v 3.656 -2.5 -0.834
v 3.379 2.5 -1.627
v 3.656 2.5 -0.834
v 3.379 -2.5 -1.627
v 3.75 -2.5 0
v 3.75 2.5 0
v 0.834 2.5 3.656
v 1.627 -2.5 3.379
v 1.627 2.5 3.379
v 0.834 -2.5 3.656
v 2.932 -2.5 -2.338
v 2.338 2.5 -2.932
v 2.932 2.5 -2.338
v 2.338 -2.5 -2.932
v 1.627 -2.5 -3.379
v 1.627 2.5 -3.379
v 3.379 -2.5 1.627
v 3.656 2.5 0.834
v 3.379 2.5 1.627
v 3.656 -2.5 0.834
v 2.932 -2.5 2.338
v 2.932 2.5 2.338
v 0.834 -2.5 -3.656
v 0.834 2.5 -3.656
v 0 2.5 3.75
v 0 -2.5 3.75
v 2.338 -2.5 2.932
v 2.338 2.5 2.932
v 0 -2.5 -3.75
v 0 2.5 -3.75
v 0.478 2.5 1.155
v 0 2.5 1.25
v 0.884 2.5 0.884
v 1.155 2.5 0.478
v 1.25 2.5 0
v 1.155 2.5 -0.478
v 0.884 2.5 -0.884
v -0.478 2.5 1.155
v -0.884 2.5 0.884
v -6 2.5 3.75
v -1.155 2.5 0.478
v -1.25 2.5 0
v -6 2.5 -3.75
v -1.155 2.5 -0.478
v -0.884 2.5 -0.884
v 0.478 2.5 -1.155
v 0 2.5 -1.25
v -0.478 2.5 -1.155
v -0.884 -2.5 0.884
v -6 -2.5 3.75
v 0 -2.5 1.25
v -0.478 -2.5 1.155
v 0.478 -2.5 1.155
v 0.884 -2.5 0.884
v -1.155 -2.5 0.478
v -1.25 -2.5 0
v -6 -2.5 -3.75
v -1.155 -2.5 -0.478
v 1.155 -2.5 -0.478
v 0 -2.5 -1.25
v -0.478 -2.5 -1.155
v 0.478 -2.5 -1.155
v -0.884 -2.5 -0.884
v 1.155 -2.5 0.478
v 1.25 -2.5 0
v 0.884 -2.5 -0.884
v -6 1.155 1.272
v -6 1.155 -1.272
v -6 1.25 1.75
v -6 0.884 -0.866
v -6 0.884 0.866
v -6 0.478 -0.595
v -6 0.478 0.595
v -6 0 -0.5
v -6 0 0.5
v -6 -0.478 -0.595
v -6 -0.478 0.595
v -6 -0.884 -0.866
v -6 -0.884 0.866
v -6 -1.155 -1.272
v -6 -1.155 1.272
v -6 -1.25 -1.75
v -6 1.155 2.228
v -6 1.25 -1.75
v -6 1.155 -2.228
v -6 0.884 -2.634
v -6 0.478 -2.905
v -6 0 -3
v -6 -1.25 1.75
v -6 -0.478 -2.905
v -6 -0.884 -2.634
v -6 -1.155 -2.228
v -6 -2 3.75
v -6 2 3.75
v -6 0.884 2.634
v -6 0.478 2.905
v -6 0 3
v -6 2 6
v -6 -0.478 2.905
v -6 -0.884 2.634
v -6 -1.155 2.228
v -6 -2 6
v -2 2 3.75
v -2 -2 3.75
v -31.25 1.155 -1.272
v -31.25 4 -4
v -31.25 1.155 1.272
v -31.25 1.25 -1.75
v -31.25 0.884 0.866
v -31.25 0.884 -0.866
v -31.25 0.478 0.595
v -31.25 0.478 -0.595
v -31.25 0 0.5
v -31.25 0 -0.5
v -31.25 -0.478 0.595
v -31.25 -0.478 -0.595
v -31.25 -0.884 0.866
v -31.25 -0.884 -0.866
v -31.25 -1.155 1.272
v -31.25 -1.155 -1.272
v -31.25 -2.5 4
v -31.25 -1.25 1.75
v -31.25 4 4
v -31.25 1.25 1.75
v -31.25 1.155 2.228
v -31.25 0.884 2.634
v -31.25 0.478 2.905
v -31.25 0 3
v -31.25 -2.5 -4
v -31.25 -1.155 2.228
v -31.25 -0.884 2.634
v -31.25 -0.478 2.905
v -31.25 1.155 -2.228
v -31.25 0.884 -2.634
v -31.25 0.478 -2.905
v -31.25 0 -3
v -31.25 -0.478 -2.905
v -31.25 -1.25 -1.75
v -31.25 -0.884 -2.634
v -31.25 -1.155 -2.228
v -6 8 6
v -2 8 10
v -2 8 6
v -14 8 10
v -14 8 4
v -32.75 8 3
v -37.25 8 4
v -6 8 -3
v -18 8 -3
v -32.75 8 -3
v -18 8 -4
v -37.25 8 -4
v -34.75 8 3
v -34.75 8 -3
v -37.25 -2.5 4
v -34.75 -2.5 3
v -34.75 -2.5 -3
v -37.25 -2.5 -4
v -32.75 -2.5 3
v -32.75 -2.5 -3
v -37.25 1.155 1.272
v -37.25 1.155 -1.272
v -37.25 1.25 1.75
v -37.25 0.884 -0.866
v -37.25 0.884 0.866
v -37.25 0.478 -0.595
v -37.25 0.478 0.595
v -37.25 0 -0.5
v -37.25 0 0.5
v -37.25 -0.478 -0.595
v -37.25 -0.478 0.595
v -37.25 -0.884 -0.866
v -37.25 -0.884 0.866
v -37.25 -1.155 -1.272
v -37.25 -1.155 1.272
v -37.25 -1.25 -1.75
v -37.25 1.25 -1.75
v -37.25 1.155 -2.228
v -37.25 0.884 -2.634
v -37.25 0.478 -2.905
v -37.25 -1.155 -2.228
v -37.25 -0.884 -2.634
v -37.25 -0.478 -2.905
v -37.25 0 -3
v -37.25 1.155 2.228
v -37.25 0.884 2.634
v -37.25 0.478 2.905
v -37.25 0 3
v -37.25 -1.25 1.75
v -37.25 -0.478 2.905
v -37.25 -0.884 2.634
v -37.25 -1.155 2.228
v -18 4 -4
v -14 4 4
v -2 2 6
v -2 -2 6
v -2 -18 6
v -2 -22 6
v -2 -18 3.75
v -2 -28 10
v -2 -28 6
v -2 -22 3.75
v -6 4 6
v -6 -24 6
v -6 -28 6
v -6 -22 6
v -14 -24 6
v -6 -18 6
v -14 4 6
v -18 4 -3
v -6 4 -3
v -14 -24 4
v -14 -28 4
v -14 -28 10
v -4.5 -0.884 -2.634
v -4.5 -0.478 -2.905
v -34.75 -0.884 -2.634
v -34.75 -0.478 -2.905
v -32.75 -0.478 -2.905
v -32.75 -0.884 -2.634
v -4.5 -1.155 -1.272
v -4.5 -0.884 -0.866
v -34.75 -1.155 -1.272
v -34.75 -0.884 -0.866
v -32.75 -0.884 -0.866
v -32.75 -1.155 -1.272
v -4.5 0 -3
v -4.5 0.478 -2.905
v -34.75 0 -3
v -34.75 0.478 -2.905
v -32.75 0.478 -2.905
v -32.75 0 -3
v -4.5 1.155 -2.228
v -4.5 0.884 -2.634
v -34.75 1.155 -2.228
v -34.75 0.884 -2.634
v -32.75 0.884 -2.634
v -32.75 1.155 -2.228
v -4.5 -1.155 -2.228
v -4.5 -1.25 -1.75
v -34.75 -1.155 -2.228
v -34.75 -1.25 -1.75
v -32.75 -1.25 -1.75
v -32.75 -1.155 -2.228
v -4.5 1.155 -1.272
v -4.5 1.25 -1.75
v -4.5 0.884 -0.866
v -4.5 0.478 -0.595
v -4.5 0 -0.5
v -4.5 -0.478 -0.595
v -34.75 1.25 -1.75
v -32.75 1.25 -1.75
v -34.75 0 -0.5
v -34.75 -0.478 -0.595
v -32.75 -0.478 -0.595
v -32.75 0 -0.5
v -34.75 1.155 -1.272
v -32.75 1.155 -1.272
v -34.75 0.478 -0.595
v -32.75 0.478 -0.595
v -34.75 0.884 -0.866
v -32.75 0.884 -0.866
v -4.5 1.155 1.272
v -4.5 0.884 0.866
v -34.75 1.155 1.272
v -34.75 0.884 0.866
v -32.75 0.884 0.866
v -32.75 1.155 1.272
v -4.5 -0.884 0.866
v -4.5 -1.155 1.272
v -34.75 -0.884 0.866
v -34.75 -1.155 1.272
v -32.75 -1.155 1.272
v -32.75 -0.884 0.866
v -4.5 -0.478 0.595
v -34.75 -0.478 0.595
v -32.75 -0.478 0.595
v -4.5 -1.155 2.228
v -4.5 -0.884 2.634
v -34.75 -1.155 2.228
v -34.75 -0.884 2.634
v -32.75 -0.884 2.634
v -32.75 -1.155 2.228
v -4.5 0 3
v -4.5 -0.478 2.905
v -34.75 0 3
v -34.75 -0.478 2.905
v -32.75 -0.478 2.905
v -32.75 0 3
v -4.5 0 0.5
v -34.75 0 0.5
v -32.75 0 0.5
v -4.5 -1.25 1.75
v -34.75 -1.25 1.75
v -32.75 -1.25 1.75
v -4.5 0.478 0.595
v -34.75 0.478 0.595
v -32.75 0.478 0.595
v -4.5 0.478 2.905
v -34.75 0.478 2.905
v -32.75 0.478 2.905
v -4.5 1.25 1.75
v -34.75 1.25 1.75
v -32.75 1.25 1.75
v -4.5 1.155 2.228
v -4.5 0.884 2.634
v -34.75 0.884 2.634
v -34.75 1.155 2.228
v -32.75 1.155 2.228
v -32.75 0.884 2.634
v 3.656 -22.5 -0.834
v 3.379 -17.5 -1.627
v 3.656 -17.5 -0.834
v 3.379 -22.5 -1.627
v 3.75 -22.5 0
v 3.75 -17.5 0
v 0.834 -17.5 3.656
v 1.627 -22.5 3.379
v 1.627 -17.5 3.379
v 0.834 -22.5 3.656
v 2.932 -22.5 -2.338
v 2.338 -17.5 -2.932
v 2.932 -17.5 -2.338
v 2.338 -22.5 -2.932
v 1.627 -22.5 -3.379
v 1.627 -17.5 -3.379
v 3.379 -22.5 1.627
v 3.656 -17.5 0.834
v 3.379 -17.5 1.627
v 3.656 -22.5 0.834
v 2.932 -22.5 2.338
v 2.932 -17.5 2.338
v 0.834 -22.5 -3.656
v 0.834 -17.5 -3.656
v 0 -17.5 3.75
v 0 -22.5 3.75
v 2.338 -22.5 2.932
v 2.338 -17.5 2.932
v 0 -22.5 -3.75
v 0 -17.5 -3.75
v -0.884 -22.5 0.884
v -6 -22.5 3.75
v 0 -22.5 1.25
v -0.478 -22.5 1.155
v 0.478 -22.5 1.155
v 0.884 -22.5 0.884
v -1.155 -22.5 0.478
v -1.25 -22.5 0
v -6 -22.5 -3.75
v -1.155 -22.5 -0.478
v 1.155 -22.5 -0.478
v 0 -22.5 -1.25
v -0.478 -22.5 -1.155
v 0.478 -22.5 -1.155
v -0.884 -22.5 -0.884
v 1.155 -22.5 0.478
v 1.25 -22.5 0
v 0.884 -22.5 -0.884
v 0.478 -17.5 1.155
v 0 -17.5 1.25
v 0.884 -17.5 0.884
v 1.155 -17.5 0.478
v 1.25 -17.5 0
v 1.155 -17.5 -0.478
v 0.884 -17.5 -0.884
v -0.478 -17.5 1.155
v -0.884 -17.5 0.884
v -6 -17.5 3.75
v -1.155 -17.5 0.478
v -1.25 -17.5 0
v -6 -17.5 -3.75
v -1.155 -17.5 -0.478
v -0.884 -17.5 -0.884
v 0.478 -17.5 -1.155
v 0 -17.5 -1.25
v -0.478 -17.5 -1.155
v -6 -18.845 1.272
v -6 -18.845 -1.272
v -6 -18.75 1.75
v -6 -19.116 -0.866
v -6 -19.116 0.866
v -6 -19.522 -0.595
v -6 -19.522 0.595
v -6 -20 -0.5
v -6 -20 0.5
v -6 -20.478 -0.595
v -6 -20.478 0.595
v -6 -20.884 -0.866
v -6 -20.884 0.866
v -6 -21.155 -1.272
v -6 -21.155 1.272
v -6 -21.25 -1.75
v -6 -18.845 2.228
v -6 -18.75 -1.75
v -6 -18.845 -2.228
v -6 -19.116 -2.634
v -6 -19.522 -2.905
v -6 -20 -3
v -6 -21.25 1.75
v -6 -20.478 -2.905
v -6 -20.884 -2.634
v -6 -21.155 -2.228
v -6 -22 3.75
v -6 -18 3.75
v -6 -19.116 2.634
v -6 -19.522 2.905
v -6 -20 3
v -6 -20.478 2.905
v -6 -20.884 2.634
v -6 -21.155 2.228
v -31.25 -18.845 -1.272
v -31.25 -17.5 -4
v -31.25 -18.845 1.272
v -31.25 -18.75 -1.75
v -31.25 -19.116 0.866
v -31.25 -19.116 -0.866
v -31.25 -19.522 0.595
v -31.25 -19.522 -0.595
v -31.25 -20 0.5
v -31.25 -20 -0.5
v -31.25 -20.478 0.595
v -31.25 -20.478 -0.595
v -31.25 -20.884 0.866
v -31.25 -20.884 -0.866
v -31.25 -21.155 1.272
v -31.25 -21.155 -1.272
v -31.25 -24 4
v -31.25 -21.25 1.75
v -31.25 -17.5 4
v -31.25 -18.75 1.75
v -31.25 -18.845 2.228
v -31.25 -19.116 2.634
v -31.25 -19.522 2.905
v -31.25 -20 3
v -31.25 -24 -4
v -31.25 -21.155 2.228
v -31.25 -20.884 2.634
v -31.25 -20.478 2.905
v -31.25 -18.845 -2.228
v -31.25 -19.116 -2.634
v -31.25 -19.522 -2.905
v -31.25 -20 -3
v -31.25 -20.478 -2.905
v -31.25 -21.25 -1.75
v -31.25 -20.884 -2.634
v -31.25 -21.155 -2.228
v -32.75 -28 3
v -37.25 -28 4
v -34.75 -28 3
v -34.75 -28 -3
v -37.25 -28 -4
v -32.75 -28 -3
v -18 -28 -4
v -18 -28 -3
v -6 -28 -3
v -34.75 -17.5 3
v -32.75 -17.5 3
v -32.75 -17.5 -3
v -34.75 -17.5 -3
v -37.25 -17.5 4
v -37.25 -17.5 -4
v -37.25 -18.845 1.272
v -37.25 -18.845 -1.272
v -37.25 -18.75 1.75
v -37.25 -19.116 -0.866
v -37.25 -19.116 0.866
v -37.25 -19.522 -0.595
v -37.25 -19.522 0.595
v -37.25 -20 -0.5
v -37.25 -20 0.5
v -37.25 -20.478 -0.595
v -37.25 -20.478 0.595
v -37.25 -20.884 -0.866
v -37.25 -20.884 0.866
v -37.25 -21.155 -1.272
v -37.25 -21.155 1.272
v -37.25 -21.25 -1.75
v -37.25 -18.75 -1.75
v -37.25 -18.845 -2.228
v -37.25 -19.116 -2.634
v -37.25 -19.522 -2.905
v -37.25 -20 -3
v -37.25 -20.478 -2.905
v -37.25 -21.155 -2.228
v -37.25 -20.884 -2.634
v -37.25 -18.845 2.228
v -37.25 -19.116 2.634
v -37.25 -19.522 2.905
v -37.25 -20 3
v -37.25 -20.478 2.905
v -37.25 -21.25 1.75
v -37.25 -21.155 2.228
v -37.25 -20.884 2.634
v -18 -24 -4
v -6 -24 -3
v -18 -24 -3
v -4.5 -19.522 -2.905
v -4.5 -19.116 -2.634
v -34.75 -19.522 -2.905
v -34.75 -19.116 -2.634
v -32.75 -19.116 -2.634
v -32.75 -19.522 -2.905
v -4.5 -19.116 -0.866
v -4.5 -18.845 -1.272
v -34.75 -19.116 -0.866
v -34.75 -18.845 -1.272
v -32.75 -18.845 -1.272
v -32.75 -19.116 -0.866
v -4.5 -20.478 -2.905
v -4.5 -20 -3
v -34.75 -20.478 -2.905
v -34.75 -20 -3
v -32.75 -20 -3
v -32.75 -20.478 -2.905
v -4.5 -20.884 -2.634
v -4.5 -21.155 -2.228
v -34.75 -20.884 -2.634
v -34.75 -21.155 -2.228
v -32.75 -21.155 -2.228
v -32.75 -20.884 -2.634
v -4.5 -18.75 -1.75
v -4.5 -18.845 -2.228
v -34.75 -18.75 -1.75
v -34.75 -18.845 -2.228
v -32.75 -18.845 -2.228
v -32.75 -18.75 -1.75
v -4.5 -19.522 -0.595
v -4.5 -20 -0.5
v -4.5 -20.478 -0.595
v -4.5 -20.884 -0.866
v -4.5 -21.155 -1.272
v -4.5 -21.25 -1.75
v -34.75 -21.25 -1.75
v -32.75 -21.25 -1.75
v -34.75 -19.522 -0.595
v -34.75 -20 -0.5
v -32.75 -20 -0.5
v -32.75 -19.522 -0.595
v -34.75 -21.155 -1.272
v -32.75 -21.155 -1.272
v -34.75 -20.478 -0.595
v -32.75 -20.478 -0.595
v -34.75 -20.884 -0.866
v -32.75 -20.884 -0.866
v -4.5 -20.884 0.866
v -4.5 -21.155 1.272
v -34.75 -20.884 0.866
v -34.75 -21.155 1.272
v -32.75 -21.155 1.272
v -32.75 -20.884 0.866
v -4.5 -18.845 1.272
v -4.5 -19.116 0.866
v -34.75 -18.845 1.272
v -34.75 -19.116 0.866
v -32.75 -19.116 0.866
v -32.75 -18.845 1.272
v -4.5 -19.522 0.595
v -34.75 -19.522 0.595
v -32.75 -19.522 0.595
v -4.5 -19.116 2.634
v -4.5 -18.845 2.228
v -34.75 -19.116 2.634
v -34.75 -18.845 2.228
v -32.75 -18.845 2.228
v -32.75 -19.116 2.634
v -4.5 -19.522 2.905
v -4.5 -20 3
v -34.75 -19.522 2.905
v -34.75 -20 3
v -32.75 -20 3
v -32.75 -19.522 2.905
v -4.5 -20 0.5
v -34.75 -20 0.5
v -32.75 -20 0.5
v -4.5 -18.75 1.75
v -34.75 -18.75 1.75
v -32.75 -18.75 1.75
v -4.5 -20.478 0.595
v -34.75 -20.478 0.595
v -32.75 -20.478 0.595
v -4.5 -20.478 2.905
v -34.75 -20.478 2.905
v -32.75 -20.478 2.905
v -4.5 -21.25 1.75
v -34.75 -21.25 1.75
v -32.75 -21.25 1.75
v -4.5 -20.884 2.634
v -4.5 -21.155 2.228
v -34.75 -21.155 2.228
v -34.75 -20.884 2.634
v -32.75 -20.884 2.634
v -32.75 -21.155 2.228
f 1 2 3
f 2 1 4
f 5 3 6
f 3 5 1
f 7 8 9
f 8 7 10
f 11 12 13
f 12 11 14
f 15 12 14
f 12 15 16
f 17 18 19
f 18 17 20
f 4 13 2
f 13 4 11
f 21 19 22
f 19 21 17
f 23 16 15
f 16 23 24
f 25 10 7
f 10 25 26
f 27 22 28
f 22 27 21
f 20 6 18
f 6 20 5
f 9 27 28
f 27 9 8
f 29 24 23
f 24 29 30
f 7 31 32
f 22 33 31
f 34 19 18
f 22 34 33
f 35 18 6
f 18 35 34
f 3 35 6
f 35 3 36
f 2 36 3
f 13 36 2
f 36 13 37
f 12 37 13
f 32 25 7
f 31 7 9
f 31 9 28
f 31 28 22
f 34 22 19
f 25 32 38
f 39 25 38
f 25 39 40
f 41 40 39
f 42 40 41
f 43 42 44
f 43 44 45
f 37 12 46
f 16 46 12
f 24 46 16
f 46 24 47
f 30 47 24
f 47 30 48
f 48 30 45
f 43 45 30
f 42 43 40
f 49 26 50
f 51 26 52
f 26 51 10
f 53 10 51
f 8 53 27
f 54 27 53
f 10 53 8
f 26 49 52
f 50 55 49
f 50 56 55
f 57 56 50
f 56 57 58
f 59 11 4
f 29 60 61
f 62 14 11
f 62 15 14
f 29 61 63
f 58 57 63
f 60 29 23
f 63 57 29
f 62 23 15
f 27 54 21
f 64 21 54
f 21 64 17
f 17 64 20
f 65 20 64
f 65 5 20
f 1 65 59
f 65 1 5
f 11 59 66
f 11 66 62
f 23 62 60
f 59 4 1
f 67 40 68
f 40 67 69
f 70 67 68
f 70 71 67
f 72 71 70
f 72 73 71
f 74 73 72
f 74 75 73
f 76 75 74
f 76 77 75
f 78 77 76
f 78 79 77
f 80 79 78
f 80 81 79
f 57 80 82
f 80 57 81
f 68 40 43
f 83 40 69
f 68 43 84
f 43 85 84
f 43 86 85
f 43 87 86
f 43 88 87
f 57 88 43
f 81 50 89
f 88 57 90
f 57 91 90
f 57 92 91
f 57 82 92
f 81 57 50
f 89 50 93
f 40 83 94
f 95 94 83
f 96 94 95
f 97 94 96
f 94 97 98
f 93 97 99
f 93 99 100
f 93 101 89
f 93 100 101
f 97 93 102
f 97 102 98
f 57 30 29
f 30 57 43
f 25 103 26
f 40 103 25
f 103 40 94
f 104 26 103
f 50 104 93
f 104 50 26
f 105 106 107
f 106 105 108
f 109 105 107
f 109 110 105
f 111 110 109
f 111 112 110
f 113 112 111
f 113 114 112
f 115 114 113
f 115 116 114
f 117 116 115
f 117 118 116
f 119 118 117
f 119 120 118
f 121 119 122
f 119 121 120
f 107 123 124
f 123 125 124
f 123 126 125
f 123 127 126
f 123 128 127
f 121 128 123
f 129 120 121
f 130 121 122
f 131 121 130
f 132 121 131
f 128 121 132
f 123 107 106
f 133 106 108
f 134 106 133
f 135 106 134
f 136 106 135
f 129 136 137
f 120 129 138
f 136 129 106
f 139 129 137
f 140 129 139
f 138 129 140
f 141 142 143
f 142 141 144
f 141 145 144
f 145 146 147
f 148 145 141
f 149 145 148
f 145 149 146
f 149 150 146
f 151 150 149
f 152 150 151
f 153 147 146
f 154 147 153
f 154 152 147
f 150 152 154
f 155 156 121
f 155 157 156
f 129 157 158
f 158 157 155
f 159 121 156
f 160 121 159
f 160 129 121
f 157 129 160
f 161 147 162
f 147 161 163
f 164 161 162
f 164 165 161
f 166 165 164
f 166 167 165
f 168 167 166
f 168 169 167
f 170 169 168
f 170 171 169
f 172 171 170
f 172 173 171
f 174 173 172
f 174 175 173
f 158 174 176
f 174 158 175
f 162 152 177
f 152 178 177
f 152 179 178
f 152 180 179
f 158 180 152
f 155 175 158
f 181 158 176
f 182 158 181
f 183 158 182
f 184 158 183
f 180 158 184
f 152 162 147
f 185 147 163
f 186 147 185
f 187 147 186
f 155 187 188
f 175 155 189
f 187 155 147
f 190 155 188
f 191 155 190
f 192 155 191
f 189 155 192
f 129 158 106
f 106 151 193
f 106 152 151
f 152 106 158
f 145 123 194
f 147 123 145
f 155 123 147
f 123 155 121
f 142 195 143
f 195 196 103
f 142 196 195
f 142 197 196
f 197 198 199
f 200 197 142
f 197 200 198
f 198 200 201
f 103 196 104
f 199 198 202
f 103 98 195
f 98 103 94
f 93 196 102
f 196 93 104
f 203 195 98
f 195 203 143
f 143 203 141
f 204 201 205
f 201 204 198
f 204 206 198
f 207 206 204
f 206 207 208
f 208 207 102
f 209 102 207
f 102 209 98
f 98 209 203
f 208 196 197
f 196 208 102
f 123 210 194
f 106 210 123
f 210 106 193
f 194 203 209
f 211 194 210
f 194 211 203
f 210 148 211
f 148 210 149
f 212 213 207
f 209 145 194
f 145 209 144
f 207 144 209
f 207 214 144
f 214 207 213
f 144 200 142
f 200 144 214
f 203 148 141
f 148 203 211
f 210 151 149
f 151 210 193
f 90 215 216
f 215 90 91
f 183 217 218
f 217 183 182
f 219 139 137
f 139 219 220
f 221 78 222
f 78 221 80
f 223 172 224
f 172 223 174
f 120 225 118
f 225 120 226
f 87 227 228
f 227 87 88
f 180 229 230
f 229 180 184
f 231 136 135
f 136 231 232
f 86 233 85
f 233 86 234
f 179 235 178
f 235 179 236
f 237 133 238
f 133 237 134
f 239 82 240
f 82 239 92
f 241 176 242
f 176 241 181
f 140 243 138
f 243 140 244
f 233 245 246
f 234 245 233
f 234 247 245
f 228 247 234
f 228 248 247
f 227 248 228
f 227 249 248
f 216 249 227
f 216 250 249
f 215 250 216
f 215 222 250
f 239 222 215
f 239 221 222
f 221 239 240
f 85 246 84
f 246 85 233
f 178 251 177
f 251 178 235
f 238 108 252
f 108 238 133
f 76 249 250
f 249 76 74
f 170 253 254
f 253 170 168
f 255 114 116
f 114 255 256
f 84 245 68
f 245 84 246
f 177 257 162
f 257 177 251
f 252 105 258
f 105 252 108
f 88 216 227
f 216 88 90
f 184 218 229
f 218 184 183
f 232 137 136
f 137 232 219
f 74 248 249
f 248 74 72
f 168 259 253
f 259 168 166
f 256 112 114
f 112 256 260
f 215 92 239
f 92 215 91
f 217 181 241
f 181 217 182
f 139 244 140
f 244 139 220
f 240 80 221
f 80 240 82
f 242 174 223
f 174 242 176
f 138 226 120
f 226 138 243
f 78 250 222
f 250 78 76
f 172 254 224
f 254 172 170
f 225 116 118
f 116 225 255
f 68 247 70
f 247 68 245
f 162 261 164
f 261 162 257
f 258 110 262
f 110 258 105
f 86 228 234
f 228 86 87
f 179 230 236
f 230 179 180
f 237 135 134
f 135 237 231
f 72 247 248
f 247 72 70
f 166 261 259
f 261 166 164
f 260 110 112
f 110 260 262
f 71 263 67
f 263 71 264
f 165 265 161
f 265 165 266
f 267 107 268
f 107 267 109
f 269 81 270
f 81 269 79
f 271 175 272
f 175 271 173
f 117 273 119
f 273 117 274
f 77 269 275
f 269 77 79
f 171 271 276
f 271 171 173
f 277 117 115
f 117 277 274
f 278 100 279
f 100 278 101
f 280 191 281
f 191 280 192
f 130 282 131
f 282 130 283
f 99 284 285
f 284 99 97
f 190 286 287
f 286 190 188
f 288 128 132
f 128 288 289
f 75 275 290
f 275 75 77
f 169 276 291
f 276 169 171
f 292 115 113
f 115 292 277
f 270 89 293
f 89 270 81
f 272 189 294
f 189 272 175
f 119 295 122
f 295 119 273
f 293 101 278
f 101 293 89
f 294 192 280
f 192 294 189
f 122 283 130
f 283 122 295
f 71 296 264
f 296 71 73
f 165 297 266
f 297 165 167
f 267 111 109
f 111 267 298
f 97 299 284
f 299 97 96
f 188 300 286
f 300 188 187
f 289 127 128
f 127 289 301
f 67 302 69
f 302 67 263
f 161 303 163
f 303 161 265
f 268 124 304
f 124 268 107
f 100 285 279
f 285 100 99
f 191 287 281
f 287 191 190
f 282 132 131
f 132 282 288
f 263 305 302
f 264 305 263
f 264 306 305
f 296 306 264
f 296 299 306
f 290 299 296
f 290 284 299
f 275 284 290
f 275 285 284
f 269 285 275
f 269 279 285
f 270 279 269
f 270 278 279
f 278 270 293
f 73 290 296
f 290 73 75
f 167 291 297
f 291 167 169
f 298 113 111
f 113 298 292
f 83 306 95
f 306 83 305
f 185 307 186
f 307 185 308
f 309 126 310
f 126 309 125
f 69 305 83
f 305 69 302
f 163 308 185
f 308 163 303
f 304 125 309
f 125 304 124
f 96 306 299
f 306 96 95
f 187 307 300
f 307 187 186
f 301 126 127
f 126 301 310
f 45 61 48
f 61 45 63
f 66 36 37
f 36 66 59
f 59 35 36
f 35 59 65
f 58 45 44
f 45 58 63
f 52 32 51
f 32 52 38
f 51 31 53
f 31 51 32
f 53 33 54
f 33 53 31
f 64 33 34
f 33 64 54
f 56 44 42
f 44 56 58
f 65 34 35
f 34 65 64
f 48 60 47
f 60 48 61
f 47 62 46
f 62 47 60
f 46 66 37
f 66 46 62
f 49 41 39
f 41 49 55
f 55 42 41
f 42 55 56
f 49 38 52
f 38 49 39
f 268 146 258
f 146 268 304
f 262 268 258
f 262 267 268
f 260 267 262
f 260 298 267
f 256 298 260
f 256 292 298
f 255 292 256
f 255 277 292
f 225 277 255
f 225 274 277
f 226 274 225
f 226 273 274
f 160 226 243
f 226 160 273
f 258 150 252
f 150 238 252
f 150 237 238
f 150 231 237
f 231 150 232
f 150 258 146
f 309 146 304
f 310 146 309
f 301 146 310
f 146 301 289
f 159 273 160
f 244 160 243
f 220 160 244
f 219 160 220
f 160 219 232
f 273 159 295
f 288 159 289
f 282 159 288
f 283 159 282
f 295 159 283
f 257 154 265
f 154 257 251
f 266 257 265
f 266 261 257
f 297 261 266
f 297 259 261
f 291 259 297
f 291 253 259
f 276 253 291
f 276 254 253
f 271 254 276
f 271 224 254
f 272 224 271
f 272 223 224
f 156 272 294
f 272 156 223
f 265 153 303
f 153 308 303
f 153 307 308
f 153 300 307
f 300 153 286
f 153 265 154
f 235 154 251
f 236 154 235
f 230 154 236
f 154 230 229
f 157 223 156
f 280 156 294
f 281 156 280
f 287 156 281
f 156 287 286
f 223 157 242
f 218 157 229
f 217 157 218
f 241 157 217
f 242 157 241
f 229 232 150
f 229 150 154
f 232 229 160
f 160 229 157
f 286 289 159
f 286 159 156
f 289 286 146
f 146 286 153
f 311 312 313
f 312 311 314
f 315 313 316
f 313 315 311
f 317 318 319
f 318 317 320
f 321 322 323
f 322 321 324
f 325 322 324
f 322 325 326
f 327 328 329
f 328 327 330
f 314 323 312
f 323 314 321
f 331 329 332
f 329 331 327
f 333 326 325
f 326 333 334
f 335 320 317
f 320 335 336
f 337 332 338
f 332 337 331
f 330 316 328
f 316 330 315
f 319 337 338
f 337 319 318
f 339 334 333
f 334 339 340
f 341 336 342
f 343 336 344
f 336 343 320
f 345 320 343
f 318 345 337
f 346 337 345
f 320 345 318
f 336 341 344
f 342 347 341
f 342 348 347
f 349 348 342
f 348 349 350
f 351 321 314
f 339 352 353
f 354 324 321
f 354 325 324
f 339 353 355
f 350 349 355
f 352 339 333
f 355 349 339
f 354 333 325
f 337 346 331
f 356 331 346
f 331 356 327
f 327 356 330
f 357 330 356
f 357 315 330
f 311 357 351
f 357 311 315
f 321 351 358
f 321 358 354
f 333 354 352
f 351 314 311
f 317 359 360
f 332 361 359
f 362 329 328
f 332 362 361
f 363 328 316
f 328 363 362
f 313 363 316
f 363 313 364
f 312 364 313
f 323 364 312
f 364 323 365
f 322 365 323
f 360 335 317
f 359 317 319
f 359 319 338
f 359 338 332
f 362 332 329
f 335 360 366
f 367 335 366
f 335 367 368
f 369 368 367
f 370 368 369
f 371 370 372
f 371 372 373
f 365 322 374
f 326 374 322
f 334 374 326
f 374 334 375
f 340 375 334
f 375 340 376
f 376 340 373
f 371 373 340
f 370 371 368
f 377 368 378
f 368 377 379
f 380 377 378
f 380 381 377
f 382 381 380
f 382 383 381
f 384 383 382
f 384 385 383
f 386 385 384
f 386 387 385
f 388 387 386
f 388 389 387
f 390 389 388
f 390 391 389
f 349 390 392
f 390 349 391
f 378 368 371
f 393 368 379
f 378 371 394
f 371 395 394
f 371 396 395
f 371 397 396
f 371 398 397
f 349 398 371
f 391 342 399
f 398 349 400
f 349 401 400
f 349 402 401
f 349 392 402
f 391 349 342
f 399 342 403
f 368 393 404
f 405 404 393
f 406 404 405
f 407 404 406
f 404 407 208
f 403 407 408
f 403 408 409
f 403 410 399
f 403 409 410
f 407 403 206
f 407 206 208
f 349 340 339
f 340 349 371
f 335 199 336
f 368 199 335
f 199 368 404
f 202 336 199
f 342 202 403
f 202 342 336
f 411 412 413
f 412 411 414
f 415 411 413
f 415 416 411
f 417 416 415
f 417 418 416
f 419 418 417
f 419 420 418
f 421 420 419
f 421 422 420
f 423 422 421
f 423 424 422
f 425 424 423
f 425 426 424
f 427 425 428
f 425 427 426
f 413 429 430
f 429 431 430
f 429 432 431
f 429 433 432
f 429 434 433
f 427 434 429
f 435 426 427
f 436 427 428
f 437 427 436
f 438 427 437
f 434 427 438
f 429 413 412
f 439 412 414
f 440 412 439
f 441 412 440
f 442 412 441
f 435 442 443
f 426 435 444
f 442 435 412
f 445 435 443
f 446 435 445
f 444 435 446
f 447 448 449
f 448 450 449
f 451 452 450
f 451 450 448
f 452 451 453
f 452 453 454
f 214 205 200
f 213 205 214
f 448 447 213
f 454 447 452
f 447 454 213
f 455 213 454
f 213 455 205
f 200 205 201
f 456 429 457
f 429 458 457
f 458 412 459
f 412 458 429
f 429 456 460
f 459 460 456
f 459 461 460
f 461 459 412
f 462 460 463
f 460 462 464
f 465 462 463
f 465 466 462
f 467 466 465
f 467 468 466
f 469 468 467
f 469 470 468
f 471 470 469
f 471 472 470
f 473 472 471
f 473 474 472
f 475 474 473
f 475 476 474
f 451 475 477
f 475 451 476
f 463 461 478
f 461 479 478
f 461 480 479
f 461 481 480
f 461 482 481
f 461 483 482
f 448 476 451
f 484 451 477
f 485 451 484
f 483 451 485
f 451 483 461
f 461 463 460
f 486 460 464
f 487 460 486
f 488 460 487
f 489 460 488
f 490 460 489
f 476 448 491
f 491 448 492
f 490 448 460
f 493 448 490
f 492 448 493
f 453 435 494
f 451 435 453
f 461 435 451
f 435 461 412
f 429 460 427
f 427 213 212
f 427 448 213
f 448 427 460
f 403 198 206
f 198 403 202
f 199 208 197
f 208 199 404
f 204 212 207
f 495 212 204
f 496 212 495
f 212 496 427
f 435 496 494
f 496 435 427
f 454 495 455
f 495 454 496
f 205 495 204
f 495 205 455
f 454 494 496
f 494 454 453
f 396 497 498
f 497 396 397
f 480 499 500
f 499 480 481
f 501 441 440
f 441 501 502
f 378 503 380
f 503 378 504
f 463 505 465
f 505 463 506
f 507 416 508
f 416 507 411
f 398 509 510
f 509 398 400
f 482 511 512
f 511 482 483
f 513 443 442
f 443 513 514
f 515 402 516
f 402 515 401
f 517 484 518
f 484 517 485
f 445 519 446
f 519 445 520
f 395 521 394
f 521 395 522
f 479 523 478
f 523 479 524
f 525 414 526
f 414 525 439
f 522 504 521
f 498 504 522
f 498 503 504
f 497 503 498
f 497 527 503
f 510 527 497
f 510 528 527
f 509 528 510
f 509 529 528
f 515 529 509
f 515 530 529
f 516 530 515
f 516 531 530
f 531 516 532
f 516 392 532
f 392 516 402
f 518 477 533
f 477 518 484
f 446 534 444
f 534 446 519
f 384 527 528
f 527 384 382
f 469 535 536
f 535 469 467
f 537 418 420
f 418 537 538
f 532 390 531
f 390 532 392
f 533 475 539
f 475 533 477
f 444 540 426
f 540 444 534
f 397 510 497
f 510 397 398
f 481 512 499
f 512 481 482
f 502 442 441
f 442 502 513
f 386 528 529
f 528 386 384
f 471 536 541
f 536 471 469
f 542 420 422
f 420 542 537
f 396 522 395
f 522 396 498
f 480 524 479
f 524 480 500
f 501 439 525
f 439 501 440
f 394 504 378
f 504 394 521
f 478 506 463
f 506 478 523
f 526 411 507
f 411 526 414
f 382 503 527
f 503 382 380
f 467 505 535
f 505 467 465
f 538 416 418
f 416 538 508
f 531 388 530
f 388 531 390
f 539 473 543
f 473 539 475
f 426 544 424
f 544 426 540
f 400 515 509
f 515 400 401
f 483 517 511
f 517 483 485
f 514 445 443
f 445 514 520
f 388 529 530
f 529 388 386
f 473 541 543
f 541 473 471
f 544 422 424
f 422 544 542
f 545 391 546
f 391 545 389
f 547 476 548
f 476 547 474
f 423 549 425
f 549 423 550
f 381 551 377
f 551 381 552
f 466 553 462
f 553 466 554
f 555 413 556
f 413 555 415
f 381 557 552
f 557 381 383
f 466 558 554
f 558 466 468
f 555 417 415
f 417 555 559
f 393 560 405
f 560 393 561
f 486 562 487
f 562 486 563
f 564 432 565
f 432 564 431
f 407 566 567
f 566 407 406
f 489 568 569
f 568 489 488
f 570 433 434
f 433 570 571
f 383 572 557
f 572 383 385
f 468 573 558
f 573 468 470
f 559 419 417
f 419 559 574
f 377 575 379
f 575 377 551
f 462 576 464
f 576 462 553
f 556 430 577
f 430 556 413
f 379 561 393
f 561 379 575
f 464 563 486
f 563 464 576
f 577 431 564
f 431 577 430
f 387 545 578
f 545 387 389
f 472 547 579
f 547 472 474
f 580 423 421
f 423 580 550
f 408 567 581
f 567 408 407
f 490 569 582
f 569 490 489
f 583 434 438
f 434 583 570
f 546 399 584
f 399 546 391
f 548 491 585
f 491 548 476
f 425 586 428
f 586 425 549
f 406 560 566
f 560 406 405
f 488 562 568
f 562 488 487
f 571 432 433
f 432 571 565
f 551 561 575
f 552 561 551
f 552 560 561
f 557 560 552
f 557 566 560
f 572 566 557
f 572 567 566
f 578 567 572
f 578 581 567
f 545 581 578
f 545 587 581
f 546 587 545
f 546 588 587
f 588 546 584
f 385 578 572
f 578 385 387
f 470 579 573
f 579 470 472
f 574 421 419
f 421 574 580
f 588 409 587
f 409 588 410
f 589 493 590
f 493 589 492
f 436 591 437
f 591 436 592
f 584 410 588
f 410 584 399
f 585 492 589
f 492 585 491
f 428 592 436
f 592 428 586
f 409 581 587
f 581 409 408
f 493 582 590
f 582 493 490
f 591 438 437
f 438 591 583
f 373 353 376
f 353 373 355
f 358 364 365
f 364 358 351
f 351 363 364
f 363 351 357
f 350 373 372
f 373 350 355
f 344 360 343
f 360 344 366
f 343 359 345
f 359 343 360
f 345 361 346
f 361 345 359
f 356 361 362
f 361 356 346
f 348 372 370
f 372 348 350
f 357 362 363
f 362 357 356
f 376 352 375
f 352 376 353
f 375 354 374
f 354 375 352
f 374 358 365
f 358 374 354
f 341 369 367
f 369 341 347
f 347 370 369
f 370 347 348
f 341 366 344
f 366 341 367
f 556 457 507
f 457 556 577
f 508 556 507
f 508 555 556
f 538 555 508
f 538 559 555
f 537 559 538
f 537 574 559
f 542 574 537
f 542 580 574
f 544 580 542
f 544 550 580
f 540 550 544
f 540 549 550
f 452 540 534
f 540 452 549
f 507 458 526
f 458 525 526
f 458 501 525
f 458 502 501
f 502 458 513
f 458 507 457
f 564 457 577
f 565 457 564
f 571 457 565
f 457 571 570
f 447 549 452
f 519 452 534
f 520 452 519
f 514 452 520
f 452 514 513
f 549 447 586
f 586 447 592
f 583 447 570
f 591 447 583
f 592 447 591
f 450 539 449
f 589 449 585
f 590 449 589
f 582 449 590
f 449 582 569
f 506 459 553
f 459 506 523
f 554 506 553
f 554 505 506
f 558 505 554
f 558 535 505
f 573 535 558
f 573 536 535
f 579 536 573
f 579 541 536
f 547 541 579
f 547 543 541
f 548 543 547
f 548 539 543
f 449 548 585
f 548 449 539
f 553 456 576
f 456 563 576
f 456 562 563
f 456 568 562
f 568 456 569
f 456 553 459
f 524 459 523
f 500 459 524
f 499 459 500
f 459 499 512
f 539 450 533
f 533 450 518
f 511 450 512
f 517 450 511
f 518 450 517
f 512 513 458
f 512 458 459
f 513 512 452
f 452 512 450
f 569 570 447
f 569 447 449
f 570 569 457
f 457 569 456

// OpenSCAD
// file: ../motors/MN5212.scad
use <../utils.scad>

module MN5212(){

	//render(){
		difference(){
			union(){
				translate([0,0, 42.5 / 2 - 23 / 2 - 4.9 - 6])
					cylinder(
						h = 23,
						r = 59 / 2,
						$fa = fa(59 / 2),
						center = true);
				translate([0,0, 42.5 / 2 - 4.9 / 2 - 6])
					cylinder(
						h = 4.9,
						r1 = 59 / 2,
						r2 = 24.8 / 2,
						$fa = fa(59 / 2),
						center = true);
				translate([0,0, - 42.5 / 2 + 5.6 / 2 + 3])
					cylinder(
						h = 5.6,
						r1 = 44 / 2,
						r2 = 59 / 2,
						$fa = fa(59 / 2),
						center = true);
				translate([0, 0, 42.5 / 2 - 3])
					cylinder(
						h = 6,
						r = 4 / 2,
						$fa = fa(4 / 2),
						center = true);
				translate([0, 0, - 42.5 / 2 + 1.5])
					cylinder(
						h = 3,
						r = 6 / 2,
						$fa = fa(6 / 2),
						center = true);
			}
			union(){
				for(i = [0:90:270])
					rotate([0, 0, i])
						translate([0, 25 / 2, -16.25 - 0.025])
							cylinder(
								h = 4,
								r = 3 / 2,
								$fa = fa(3 / 2),
								center = true);
				for(i = [0:120:240])
					rotate([0, 0, i])
						translate([0, 17 / 2, 12.75 + 0.025])
							cylinder(
								h = 5,
								r = 3 / 2,
								$fa = fa(3 / 2),
								center = true);
				rotate([0, 0, 30])
					translate([0, 12 / 2, 12.75 + 0.025])
						cylinder(
							h = 5,
							r = 3 / 2,
							$fa = fa(3 / 2),
							center = true);
				rotate([0, 0, 30 + 180])
					translate([0, 12 / 2, 12.75 + 0.025])
						cylinder(
							h = 5,
							r = 3 / 2,
							$fa = fa(3 / 2),
							center = true);
			}
		}

	//}

}

MN5212();
// file: ../servos/TGY_4805_2PA.scad
use <../utils.scad>

module TGY_4805_2PA(){

	length = 40;
	width = 20;
	depth = 36.4;
	wing_width = 58;
	wing_thick = 2.45;
	wing_height = 27.7;
	shaft_offset = 9.5;
	hole_seperation = 9.2;
	hole_spacing = 50;
	shaft_height = 40;
	shaft_length = 3.6;
	hole_diameter = 4.8;

	module mounting_hole(){
		mh_rad = hole_diameter / 2;
		translate(
			[
				hole_spacing / 2,
				0,
				-depth / 2 + wing_height - wing_thick / 2
			])
			cylinder(h = 5, r = mh_rad, $fa = fa(mh_rad), center = true);
	}

	difference(){
		union(){
			cube([length, width, depth], center = true);
			translate([0, 0, -depth / 2 + wing_height - wing_thick / 2])
				cube([wing_width, width, wing_thick], center = true);
			translate(
				[
					- length / 2 + shaft_offset,
					0,
					shaft_height - length / 2 + shaft_length / 2
				])
				cylinder(
					h = shaft_length,
					r = 1.5,
					$fa = fa(1.5),
					center = true);
		}	union(){

			translate([0, hole_seperation / 2, 0]){
				mounting_hole();
				mirror() mounting_hole();
			}
			translate([0, -hole_seperation / 2, 0]){
				mounting_hole();
				mirror() mounting_hole();
			}
		}
	}
}

module TGY_4805_2PA_translate(){
	length = 40;
	shaft_offset = 9.5;
	shaft_height = 40;
	shaft_length = 3.6;
	translate(
		[
				- length / 2 + shaft_offset,
				0,
				shaft_height - length / 2 + shaft_length / 2
		]) children();
}

TGY_4805_2PA();
// file: ../servos/HS_5065MG.scad
use <../utils.scad>

module HS_5065MG(){

	length = 23.75;
	width = 11.68;
	depth = 20.32;
	wing_width = 32.38;
	wing_thick = 2;
	wing_offset = 1;
	shaft_offset = 6;
	hole_spacing = 28.32;
	hole_spacing_2 = 27;
	hole_2_wide = 6;
	hole_diameter = 2;
	shaft_height = 26.16;
	shaft_length = 2;

	module mounting_hole(){
		mh_rad = hole_diameter / 2;
		translate(
			[
				hole_spacing / 2,
				0,
				depth / 2 - wing_thick / 2
			])
			cylinder(h = 5, r = mh_rad, $fa = fa(mh_rad), center = true);
		translate(
			[
				hole_spacing_2 / 2,
				hole_2_wide / 2,
				depth / 2 - wing_thick / 2
			])
			cylinder(h = 5, r = mh_rad, $fa = fa(mh_rad), center = true);
		translate(
			[
				hole_spacing_2 / 2,
				- hole_2_wide / 2,
				depth / 2 - wing_thick / 2
			])
			cylinder(h = 5, r = mh_rad, $fa = fa(mh_rad), center = true);
	}

	difference(){
		union(){
			cube([length, width, depth], center = true);
			translate([0, 0, depth / 2 - wing_thick / 2 - wing_offset])
				cube([wing_width, width, wing_thick], center = true);
			translate(
				[
					- length / 2 + shaft_offset,
					0,
					depth / 2 + 3.8 + 1.9 + shaft_length / 2
				])
				cylinder(
					h = shaft_length,
					r = 1.5,
					$fa = fa(1.5),
					center = true);
			translate(
				[
					- length / 2 + shaft_offset,
					0,
					depth / 2 + 3.8 / 2
				])
				cylinder(
					h = 3.8,
					r = 11.3 / 2,
					$fa = fa(11.3 / 2),
					center = true);
			translate(
				[
					- length / 2 + shaft_offset,
					0,
					depth / 2 + 3.8 + 1.9 / 2
				])
				cylinder(
					h = 1.9,
					r1 = 11.3 / 2,
					r2 = 8 / 2,
					$fa = fa(11.3 / 2),
					center = true);
		}	union(){

			mounting_hole();
			mirror() mounting_hole();
		}
	}
}

module HS_5065MG_arm(){

	hole_size = 1.5;
	hole_spacing = 3;
	hole_offset = 9.6;

	difference(){
		union(){
			translate([0, 0, 4.4 / 2])
				cylinder(
					h = 4.4,
					r = 8 / 2,
					$fa = fa(8 / 2),
					center = true);
			hull(){
				translate([0, 0, 4.4 - 1.8 / 2])
					cylinder(
						h = 1.8,
						r = 8 / 2,
						$fa = fa(8 / 2),
						center = true);
				translate([18.8, 0, 4.4 - 1.8 / 2])
					cylinder(
						h = 1.8,
						r = 5 / 2,
						$fa = fa(5 / 2),
						center = true);
			}
		}
		union(){
			for(i = [0:3]){
				translate([hole_offset + hole_spacing * i, 0, 4.4 - 1.8 / 2])
					cylinder(
						h = 5,
						r = hole_size / 2,
						$fa = fa(hole_size / 2),
						center = true);
			}
		}
	}
}

module HS_5065MG_shaft_translate(){
	translate(
		[
			- 23.75 / 2 + 6,
			0,
			20.32 / 2 + 3.8 + 1.9
		])
			children();
}

HS_5065MG();
HS_5065MG_shaft_translate() HS_5065MG_arm();
// file: ../servos/LS_0006_servo.scad
// Author Michael Marques (DrYerzinia)

use <../utils.scad>

module ls_0006_servo(){
	
	length = 21.4;
	depth = 19.9;
	thickness = 11.65;

	gear_height = 2.6;
	gear_bump_height = 0.7;
	gear_bump_diameter = 1.97;
	gear_outer_bump_diameter = 6;
	gear_bump_offset = 12.2;

	shaft_height = 2.4;
	shaft_diameter = 3.74;
	shaft_offset = thickness / 2;
	shaft_screw_diameter = 1.3;
	
	wing_outer_width = 8.5;
	wing_top_off = 3.8;
	wing_length = 3.8;
	wing_thickness = 1.2;
	wing_hole_diameter = 1.85;
	wing_hole_edge_dist = 2;

	module wing_hole(){
		translate(
			[
				length / 2 + wing_hole_edge_dist,
				0,
				depth/2 - wing_top_off - wing_thickness / 2
			])
			cylinder(
				h = wing_thickness + 1,
				r = wing_hole_diameter / 2,
				$fn = 16,
				center = true);
	}

	module wing(){
		translate(
			[
				length / 2,
				thickness / 2,
				depth/2 - wing_top_off - wing_thickness
			])
			rotate([0,0,-90])
				trapezoid(
					thickness,
					wing_outer_width,
					wing_length,
					wing_thickness);
	}

	// Body
	cube([length, thickness, depth], center = true);

	difference(){
		union(){

			wing();
			mirror() wing();

			// Gear Bumps
			translate([0, 0, depth/2 + gear_height / 2]){
				translate([length / 2 - gear_bump_offset, 0, 0])
					cylinder(
						h = gear_height,
						r = gear_outer_bump_diameter / 2,
						$fn = 16,
						center = true);
				translate([length / 2 - gear_bump_offset, 0, gear_height/2 + gear_bump_height / 2])
					cylinder(
						h = gear_bump_height,
						r = gear_bump_diameter / 2,
						$fn = 16,
						center = true);
				translate([length / 2 - shaft_offset, 0, 0])
					cylinder(
						h = gear_height,
						r = thickness / 2,
						$fn = 32,
						center = true);
				// Shaft
				translate([length / 2 - shaft_offset, 0, gear_height])
					cylinder(
						h = shaft_height,
						r = shaft_diameter / 2,
						$fn = 16,
						center = true);
			}

		}
		union(){

			wing_hole();
			mirror() wing_hole();

			// Shaft_hole
			translate(
				[
					length / 2 - shaft_offset,
					0,
					depth/2 + gear_height * (3 / 2) + 0.5])
				cylinder(
					h = shaft_height + 1,
					r = shaft_screw_diameter / 2,
					$fn = 16,
					center = true);

		}
	}

}

module translate_ls_0006_attachment(){

	length = 21.4;
	thickness = 11.65;
	shaft_offset = thickness / 2;
	depth = 19.9;
	float = 3.3;

	translate([length / 2 - shaft_offset, 0, depth / 2 + float])
		children();

}

module bar_attachment(){

	height = 3.75;
	bar_length = 14.7;
	bar_thickness = 1.6;
	inner_radius = 5.9;
	outer_radius = 3.95;
	shaft_diameter = 3.7;
	upper_void_diameter = 4.8;
	screw_diameter = 2;
	hole_spacing = 2;
	hole_4_diameter = 1.2;
	hole_diameter = 1;
	hole_start_off = 4.7;
	top_void_depth = 0.67;
	bottom_void_depth = 1.84;

	translate([0, 0, height / 2]){
		difference(){
			union(){

				translate([0, inner_radius / 2, height / 2 - bar_thickness])
					rotate([0,0,-90])
						trapezoid(
							inner_radius,
							outer_radius,
							bar_length,
							bar_thickness);

				cylinder(
					h = height,
					r = inner_radius / 2,
					$fn = 16,
					center = true);

				translate([bar_length, 0, height / 2 - bar_thickness / 2])
					cylinder(
						h = bar_thickness,
						r = outer_radius / 2,
						$fn = 16,
						center = true);

			}
			union(){
				// screwhole
				cylinder(
					h = height + 1,
					r = screw_diameter / 2,
					$fn = 16,
					center = true);
				// voids
				translate([0, 0, height / 2 - top_void_depth / 2 + 0.5])
					cylinder(
						h = top_void_depth + 1,
						r = upper_void_diameter / 2,
						$fn = 16,
						center = true);
				translate([0, 0,  - bottom_void_depth / 2 - 0.5])
					cylinder(
						h = bottom_void_depth + 1,
						r = shaft_diameter / 2,
						$fn = 16,
						center = true);

				for(i = [0:4]){
					dia = (i != 3) ? hole_diameter : hole_4_diameter;
					translate(
						[
							hole_start_off + hole_spacing * i,
							0,
							height / 2 - bar_thickness / 2])
						cylinder(
							h = bar_thickness + 1,
							r = dia / 2,
							$fn = 16,
							center = true);
				}

			}
		}
	}

}

ls_0006_servo();
translate_ls_0006_attachment() bar_attachment();
// file: ../servos/parallax_continuous_rotation_servo.scad
// Author Michael Marques (DrYerzinia)

module parallax_continuous_rotation_servo(){

	depth = 37.7;
	length = 40.75;
	width = 19.75;

	mount_height = 2.7;
	mount_extent = 6.1;
	mount_from_top = 7.7;

	mount_hole_diameter = 4.46;
	mount_hole_spacing = 14.4 - mount_hole_diameter;

	shaft_diameter = 5.8;
	shaft_offset = 10;
	shaft_length = 3.5;

	module mounting_hole(){

			translate(
				[
					length / 2 + 5,
					mount_hole_spacing / 2,
					depth / 2 - mount_height / 2 - mount_from_top
				]
				)
				cylinder(
					h = mount_height + 1,
					r = mount_hole_diameter / 2,
					$fn=16,
					center = true);
	}

	difference(){
		union(){

			// Body
			cube([length,width,depth], center = true);

			// Mounting wings
			translate(
				[
					0,
					0,
					depth / 2 - mount_height / 2 - mount_from_top
				])
				cube(
					[
						length + mount_extent * 2,
						width,
						mount_height
					],
					center = true);

			// Shaft
			translate(
				[
					length / 2 - shaft_offset,
					0,
					depth / 2 + shaft_length / 2
				]
				)
				cylinder(
					h = shaft_length,
					r = shaft_diameter / 2,
					$fn = 16,
					center = true
				);

		}
		union(){

			// Mounting Holes
			mounting_hole();
			mirror()
				mounting_hole();

			translate([0,-mount_hole_spacing,0]){
				mounting_hole();
				mirror()
					mounting_hole();
			}
		}
	}

}

module translate_shaft(){

	depth = 37.7;
	length = 40.75;

	shaft_offset = 10;

	translate(
		[
			length / 2 - shaft_offset,
			0,
			depth / 2
		])
		children();
}

module round_servo_attachment(){

	height = 6;
	diameter = 20.8;
	inner_diameter = 8.6;
	plate_thickness = 2.45;

	float = 2;

	depth = 37.7;
	length = 40.75;

	shaft_offset = 10;

	plate_hole_spacing = 14.5;
	plate_hole_diameter = 1.4;
	plate_hole_minor_spacing = 3.5;

	screw_hole_diameter = 3;

	inner_diameter = 8;
	
	top_depth = 1.8;
	bottom_depth = 3.4;

	void_diameter = 5.8;

	module plate_hole(){
		cylinder(
			h = plate_thickness + 1,
			r = plate_hole_diameter / 2,
			$fn = 16,
			center = true
		);
	}

	module plate_hole_group(){
		translate([0, 0, height / 2 - plate_thickness / 2]){
			translate([0, plate_hole_spacing / 2, 0]){
					plate_hole();
					translate([- plate_hole_minor_spacing, 0, 0])
						plate_hole();
					translate([  plate_hole_minor_spacing, 0, 0])
						plate_hole();
			}
		}
	}

	translate(
		[
			length / 2 - shaft_offset,
			0,
			depth / 2 + height / 2 + float
		]
		)
		difference(){

			union(){

				// inner shaft
				cylinder(
					h = height,
					r = inner_diameter / 2,
					$fn = 16,
					center = true
				);

				// top
				translate([0, 0, height / 2 - plate_thickness / 2])
					cylinder(
						h = plate_thickness,
						r = diameter / 2,
						$fn = 32,
						center = true
					);
			}

			union(){

				// plate holes
				for(ang = [0:3]){
					rotate([0,0, ang * 90])
						plate_hole_group();
				}

				// screw hole
				cylinder(
					h = height + 1,
					r = screw_hole_diameter / 2,
					$fn = 16,
					center = true
				);

				// inner voids
				translate([0, 0, height / 2 - top_depth / 2 + 1])
					cylinder(
						h = top_depth + 1,
						r = void_diameter / 2,
						$fn = 16,
						center = true
					);
				translate([0, 0, -1])
					cylinder(
						h = bottom_depth + 1,
						r = void_diameter / 2,
						$fn = 16,
						center = true
					);

			}

		}

}

parallax_continuous_rotation_servo();
round_servo_attachment();
// file: ../hardware.scad
 // Author Michael Marques (DrYerzinia)

// http://www.ebay.com/itm/10-PCS-683-3x7x2-mm-Metal-OPEN-PRECISION-Miniature-Ball-Bearing-3-7-2-/291206307942?hash=item43cd3fa066:m:mCi6eovrGVk_CjIUjlhw8yg
// E-Bay empire.rc

module washer_M3_7x3_2x0_5mm(){

	difference(){
		cylinder(
			h = 0.5,
			r = 7 / 2,
			$fn = 16,
			center = true);
		cylinder(
			h = 0.5 + 0.1,
			r = 3.2 / 2,
			$fn = 16,
			center = true);
	}

}

module bearing_3x7x2mm(){

	difference(){
		cylinder(
			h = 2,
			r = 7 / 2,
			$fn = 16,
			center = true);
		cylinder(
			h = 2 + 1,
			r = 3 / 2,
			$fn = 16,
			center = true);
	}

}

module bearing_5x8x2_5mm(){

	difference(){
		cylinder(
			h = 2.5,
			r = 8 / 2,
			$fn = 16,
			center = true);
		cylinder(
			h = 2.5 + 1,
			r = 5 / 2,
			$fn = 16,
			center = true);
	}

}

module bearing_8x16x5mm(){

	difference(){
		cylinder(
			h = 5,
			r = 16 / 2,
			$fn = 16,
			center = true);
		cylinder(
			h = 5 + 1,
			r = 8 / 2,
			$fn = 16,
			center = true);
	}

}


bearing_5x8x2_5mm();
// file: ../utils.scad
// http://forum.openscad.org/Creating-pie-pizza-slice-shape-need-a-dynamic-length-array-td3148.html

module pie_slice(r, start_angle, end_angle) {
    R = r * sqrt(2) + 1;
    a0 = (4 * start_angle + 0 * end_angle) / 4;
    a1 = (3 * start_angle + 1 * end_angle) / 4;
    a2 = (2 * start_angle + 2 * end_angle) / 4;
    a3 = (1 * start_angle + 3 * end_angle) / 4;
    a4 = (0 * start_angle + 4 * end_angle) / 4;
    if(end_angle > start_angle)
        intersection() {
        circle(r, $fa = fa(r));
        polygon([
            [0,0],
            [R * cos(a0), R * sin(a0)],
            [R * cos(a1), R * sin(a1)],
            [R * cos(a2), R * sin(a2)],
            [R * cos(a3), R * sin(a3)],
            [R * cos(a4), R * sin(a4)],
            [0,0]
       ]);
    }
}

// https://github.com/openscad/openscad/issues/29

module rotate_about(v,a) {
	translate(v) rotate(a) translate(-v) children();
}

module rotate_about_axis(v, ang, axis) {
	translate(v) rotate(ang, axis) translate(-v) children();
}

// https://github.com/robofun/openscad-utils/blob/master/trapezoid.scad

module trapezoid(width_base, width_top, height, thickness){
	

  linear_extrude(height = thickness)
		polygon(
			points =
				[
					[0,0],
					[width_base,0],
					[width_base-(width_base-width_top)/2,height],
					[(width_base-width_top)/2,height]
				],
				paths=[[0,1,2,3]]); 
  
}

// http://forum.openscad.org/fe-Tolerance-based-arc-approximation-td14212.html

function fa(r)=($fn>0)?360/$fn:($fe>0)?($fe<r)?min(45,2*acos(1-$fe/r)):45:$fa; 
// file: ../render_settings.scad
// Author Michael Marques (DrYerzinia)

// Lulzbot Mini tolerances
// x/y 0.1mm
// z   0.05mm
//
// 0.1mm   preview tolerance
// 0.025mm export  tolerance

$fs = 0.01;
$fn = undef;
$fa = 360 / 5;

$fe = 0.025;	// export
// main file
// Author Michael Marques (DrYerzinia)

include <../render_settings.scad>

use <../BB8.scad>

rotate([-90,0,0])
	Door_P11_cover_slide();
